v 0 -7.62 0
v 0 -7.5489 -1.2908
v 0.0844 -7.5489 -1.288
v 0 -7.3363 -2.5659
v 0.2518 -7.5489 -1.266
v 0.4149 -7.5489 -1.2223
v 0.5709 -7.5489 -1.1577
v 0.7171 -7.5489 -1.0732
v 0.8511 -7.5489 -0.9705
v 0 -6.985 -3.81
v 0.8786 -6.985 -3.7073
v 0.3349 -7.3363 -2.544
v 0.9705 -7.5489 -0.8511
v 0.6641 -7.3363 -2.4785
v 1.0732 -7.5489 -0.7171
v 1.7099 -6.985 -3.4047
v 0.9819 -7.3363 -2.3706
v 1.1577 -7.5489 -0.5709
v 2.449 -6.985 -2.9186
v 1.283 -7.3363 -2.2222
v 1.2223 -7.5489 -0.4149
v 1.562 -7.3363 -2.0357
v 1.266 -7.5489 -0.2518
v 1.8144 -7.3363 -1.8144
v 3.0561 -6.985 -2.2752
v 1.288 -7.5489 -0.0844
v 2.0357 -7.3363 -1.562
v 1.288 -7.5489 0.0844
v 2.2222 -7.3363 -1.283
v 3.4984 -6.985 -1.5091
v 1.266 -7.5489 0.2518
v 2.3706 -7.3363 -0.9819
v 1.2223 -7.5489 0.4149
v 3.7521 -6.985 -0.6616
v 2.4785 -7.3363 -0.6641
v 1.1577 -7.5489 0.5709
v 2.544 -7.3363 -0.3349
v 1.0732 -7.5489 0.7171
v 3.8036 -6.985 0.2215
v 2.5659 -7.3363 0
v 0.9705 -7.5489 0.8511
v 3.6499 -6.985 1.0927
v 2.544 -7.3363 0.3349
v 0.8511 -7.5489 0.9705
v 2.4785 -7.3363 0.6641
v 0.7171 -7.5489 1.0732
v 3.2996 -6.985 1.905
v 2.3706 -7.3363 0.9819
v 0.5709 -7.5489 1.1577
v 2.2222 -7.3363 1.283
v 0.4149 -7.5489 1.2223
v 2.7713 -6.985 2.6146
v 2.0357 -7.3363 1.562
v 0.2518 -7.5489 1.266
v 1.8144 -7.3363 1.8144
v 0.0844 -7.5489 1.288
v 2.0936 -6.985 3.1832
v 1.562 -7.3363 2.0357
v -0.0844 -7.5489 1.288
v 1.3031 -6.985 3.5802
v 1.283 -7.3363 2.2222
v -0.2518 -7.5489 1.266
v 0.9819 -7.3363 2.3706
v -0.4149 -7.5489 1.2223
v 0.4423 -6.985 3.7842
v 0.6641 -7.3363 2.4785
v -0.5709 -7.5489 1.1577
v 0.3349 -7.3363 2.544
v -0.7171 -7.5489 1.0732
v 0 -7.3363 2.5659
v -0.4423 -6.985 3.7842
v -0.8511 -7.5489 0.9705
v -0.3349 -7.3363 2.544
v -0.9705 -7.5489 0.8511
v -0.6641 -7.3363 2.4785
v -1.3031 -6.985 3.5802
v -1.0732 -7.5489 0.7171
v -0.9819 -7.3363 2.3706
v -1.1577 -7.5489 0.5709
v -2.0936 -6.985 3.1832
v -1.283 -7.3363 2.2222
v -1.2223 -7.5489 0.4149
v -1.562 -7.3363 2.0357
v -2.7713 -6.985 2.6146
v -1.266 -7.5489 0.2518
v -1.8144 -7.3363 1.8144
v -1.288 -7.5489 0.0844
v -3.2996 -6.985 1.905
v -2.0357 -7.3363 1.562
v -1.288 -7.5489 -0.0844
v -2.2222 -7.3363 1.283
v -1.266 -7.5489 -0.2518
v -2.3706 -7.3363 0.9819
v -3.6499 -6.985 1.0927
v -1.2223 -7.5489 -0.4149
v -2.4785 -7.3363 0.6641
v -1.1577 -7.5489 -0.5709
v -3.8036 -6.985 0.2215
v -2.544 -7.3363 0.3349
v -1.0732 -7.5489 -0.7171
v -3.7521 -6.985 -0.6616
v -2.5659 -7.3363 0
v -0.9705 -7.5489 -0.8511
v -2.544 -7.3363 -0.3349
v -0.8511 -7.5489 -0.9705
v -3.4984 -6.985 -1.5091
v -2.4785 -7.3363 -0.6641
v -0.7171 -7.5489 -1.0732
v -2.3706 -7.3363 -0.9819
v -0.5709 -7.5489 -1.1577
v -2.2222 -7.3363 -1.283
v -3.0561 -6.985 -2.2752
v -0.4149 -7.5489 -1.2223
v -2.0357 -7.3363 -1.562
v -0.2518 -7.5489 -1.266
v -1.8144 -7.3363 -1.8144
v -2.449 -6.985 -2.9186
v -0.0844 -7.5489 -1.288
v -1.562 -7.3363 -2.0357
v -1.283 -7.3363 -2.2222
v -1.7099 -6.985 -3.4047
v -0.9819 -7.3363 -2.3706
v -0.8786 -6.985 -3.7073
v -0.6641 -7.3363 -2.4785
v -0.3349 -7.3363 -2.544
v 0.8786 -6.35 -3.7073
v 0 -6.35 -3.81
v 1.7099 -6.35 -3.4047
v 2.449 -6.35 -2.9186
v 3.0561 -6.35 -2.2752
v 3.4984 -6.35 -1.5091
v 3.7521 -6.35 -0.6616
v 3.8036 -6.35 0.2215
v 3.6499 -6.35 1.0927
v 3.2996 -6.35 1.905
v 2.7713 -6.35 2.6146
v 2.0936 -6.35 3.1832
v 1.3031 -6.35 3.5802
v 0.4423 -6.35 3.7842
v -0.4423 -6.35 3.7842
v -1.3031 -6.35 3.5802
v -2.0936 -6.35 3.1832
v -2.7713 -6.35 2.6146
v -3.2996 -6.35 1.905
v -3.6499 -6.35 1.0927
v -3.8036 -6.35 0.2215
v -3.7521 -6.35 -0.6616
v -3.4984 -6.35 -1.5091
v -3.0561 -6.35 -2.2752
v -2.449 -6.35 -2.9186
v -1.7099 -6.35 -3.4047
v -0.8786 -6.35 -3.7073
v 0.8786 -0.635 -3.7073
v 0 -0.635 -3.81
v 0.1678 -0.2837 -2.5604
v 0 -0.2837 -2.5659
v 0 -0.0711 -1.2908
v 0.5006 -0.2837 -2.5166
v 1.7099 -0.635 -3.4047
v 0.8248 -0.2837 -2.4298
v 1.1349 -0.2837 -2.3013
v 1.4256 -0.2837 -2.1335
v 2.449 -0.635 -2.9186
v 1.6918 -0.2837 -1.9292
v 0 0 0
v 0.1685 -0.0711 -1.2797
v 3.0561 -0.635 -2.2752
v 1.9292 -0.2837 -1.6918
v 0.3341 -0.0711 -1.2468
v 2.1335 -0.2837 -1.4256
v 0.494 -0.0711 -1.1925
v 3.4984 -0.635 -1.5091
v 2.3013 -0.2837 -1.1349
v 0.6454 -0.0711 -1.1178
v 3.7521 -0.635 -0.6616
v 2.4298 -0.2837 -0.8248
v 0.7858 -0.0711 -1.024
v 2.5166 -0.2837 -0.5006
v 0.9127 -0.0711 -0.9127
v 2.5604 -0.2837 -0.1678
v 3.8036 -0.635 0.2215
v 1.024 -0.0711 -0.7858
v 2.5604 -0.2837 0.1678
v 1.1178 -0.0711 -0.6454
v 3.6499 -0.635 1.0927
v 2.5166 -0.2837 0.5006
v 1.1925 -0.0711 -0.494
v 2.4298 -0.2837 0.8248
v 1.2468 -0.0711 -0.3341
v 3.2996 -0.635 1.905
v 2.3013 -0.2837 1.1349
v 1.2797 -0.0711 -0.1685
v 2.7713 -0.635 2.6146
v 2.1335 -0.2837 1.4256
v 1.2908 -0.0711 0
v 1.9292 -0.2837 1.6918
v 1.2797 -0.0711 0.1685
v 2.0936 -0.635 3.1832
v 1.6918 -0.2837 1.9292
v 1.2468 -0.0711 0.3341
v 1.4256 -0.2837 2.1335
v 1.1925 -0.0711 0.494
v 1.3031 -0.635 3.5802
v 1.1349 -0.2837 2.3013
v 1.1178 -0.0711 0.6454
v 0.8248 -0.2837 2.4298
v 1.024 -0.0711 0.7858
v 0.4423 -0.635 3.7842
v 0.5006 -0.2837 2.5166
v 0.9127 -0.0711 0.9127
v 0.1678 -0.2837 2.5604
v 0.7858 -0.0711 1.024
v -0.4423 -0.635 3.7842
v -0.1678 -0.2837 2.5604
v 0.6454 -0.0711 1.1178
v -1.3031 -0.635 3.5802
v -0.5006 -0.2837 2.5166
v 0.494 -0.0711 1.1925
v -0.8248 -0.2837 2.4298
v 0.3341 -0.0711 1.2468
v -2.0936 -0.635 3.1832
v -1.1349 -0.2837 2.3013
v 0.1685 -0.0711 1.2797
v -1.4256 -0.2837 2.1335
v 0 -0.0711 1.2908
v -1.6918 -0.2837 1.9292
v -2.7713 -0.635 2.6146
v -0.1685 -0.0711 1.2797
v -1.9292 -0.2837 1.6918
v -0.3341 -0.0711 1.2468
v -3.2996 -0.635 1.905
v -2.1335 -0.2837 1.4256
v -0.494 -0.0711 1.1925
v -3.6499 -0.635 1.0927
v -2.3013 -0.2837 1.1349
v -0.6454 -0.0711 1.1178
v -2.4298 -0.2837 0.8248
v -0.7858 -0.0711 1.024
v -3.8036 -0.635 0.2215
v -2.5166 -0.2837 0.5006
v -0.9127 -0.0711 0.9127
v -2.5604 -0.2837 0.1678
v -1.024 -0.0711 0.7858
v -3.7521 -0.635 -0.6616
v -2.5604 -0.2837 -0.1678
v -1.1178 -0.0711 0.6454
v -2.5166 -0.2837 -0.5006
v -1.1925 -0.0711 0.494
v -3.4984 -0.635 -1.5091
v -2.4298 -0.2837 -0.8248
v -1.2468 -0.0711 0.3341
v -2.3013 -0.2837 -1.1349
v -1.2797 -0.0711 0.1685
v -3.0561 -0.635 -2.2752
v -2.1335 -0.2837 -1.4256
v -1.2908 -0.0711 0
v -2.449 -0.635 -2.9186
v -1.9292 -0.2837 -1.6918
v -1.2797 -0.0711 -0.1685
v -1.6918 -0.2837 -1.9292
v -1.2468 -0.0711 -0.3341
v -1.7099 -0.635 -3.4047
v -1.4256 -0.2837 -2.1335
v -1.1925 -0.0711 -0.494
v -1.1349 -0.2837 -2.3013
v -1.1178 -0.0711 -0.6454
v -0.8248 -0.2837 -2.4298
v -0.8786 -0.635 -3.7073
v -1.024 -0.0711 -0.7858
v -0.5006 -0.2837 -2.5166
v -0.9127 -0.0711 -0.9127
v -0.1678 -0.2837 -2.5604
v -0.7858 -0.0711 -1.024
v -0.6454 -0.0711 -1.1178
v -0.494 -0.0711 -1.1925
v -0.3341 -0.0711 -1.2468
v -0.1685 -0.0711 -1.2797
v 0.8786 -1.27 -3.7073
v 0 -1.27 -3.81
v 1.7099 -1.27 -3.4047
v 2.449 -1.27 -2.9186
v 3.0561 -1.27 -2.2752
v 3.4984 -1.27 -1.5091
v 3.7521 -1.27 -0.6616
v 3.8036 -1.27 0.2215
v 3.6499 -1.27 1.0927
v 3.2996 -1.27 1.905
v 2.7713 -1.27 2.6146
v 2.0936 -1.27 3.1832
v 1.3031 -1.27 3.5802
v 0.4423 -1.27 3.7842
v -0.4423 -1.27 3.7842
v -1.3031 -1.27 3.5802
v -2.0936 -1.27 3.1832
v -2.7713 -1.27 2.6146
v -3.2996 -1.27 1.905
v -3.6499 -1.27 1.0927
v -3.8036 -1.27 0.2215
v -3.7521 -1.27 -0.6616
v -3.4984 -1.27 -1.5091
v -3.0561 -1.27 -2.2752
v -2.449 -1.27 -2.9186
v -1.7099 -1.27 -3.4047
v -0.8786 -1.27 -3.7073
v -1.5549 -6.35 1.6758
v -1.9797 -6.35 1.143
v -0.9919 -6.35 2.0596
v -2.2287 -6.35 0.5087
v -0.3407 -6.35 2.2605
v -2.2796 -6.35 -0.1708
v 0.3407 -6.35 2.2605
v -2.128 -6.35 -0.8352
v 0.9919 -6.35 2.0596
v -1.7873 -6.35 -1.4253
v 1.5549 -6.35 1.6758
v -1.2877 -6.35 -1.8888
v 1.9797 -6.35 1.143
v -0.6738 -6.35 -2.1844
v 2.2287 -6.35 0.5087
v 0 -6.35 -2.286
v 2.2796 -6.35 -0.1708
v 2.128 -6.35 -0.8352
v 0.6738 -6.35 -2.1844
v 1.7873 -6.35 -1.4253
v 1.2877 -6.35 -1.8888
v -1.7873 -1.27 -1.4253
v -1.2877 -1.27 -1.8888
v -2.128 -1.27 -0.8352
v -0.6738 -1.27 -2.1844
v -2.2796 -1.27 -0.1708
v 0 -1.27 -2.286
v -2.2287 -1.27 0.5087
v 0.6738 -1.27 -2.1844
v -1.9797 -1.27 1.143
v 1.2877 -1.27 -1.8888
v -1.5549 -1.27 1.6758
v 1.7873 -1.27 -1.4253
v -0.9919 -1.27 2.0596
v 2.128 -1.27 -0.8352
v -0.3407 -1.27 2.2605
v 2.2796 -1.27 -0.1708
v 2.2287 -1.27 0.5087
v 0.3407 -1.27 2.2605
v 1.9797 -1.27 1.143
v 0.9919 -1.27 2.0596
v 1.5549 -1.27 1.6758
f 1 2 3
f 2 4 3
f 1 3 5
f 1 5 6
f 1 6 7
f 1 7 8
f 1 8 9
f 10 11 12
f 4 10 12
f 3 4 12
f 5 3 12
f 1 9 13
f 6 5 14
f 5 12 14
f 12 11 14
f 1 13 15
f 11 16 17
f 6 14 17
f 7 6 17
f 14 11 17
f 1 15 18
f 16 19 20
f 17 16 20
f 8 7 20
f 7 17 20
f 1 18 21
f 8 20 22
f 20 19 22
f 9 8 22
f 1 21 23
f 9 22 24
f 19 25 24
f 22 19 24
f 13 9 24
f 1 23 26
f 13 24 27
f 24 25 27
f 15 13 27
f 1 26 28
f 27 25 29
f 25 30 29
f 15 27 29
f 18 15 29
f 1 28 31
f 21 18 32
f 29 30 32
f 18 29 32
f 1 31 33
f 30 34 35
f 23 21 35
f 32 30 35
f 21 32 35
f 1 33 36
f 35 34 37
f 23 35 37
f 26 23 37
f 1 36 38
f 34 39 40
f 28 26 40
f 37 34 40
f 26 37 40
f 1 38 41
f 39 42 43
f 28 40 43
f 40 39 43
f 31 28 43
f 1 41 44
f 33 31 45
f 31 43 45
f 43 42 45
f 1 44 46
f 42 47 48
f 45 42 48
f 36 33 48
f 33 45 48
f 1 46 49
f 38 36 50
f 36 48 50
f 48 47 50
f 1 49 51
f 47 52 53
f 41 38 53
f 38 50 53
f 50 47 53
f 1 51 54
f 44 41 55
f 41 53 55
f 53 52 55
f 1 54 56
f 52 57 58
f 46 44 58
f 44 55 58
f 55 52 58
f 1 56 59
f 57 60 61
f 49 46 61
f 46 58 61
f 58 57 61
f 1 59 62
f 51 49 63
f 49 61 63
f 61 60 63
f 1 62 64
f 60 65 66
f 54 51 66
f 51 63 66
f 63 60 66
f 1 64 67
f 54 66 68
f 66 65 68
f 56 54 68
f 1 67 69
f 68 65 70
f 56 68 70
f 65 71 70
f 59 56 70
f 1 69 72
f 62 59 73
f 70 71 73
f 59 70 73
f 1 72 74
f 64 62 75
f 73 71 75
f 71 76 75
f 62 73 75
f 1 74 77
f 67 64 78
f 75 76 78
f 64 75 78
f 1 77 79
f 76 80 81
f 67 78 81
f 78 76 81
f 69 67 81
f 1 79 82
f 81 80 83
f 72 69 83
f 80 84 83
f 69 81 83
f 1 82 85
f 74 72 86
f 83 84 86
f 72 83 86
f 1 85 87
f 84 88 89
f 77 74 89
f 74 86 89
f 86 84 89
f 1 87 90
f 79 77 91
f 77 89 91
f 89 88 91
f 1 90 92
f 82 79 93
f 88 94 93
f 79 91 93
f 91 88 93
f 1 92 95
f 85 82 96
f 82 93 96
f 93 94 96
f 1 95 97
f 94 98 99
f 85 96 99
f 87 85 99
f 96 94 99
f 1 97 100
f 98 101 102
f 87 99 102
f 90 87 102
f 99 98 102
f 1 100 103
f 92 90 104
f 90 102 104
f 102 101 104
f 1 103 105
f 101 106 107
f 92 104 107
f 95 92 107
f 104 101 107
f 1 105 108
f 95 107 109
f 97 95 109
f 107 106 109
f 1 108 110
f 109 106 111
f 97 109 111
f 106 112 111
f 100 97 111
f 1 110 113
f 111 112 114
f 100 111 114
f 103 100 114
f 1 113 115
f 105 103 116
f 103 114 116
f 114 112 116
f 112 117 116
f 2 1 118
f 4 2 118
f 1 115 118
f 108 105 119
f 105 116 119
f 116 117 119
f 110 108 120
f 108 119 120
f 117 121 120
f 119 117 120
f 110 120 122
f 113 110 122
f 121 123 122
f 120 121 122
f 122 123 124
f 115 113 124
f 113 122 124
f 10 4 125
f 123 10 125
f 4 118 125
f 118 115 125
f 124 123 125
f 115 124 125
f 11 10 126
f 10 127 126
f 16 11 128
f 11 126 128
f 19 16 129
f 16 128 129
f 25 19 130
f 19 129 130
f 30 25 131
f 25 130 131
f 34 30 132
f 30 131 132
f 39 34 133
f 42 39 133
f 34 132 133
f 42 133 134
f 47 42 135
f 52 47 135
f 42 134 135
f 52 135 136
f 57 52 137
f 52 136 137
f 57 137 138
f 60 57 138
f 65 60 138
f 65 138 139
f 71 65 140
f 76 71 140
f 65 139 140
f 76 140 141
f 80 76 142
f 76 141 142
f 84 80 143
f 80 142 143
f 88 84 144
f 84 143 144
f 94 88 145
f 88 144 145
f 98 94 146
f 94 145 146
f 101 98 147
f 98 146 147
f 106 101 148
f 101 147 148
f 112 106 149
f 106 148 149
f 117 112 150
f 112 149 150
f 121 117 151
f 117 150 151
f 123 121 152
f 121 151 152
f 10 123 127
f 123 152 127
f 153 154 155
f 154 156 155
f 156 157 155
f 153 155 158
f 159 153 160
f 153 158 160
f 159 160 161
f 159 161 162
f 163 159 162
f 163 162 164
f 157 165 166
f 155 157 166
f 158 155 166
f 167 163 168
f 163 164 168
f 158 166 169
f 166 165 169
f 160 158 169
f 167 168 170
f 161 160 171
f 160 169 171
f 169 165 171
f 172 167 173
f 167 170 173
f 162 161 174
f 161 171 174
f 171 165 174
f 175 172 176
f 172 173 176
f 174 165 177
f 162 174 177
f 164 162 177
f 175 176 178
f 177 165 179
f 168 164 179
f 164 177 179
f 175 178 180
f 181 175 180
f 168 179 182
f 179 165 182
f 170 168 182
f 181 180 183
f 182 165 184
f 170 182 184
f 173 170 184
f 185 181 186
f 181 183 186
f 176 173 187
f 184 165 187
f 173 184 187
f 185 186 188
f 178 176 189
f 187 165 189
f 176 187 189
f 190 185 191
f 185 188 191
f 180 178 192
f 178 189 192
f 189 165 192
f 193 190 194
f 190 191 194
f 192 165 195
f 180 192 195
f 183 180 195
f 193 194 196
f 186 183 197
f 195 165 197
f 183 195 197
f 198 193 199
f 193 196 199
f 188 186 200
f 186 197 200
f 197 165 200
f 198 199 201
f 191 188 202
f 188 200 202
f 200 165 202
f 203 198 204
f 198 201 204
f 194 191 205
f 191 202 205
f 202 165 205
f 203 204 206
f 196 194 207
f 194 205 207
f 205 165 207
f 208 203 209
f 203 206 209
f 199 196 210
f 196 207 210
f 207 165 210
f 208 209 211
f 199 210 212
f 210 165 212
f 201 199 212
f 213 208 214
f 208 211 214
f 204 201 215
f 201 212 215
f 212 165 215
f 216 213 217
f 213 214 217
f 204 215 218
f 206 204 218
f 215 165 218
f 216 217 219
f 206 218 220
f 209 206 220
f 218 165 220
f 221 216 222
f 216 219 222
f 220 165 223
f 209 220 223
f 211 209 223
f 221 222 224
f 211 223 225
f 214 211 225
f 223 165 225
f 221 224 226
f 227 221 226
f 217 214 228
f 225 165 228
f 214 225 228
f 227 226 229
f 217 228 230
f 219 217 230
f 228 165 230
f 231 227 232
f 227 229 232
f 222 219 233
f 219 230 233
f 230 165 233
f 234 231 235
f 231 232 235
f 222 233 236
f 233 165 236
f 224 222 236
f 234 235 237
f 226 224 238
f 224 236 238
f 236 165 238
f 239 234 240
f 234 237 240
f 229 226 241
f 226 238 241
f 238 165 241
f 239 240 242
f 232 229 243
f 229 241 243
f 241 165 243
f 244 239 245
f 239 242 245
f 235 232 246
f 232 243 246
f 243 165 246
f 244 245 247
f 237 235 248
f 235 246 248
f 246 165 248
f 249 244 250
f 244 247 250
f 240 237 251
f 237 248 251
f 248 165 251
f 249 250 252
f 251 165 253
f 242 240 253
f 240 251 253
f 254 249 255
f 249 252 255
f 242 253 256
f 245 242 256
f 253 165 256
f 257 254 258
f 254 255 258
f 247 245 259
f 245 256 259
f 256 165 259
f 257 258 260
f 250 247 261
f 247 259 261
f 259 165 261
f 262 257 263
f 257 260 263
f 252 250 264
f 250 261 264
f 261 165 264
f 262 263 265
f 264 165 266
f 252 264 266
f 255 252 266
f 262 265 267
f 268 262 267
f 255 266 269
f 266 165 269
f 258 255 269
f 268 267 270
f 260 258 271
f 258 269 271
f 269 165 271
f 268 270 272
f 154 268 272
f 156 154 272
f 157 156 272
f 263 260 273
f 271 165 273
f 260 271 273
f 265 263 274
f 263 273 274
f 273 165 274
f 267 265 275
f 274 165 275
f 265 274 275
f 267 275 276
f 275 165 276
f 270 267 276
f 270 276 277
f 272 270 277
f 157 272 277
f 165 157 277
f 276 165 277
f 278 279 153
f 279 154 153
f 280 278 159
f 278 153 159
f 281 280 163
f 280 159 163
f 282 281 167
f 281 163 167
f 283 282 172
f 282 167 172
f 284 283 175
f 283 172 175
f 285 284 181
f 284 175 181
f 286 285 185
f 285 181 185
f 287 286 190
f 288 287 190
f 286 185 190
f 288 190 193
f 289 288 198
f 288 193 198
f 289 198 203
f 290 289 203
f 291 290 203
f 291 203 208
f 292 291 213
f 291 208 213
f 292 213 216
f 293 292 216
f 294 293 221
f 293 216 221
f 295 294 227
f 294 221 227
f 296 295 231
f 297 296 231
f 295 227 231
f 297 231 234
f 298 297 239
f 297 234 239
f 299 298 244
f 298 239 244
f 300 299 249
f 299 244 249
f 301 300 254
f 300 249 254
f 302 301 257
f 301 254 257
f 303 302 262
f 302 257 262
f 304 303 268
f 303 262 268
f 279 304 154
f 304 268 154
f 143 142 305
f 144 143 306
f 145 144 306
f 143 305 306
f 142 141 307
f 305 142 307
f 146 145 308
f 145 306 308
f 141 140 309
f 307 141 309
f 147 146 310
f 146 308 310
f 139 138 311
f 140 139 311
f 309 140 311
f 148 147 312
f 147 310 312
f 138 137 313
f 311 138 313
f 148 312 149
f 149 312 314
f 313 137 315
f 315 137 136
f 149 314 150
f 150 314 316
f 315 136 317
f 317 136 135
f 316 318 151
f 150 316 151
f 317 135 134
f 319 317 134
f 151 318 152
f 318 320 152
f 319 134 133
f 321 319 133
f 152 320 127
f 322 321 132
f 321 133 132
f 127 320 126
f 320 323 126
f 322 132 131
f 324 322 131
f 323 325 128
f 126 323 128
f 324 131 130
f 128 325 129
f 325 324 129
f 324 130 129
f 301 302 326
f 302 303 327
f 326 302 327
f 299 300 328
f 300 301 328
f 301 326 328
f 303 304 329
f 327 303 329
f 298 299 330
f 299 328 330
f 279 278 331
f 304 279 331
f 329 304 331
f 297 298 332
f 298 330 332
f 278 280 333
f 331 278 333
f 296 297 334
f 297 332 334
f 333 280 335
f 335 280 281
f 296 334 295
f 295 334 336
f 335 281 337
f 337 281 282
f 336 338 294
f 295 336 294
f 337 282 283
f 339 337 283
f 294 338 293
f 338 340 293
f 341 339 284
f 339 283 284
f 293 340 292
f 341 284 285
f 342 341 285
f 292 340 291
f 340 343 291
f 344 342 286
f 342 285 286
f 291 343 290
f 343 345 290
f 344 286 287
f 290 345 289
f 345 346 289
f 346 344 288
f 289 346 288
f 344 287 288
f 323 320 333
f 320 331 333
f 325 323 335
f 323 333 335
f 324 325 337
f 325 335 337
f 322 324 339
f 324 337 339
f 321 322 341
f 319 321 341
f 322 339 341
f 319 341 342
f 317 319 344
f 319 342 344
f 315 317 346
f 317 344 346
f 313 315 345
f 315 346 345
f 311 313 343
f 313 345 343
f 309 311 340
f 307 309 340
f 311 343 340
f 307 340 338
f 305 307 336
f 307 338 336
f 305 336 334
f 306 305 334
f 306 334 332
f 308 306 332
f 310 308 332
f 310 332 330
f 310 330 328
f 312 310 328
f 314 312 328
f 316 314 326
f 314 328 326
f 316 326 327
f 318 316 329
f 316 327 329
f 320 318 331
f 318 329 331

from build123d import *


with BuildPart() as part:
    # Sketch1 → Revolve1 (revolve)
    with BuildSketch(Plane(origin=(0, 0, 0), x_dir=(0, 0, -1), z_dir=(1, 0, 0))):
        with BuildLine():
            Line((0, 0), (0, -7.62))
            ThreePointArc((0, -7.62), (1.931277103, -7.46016262), (3.81, -6.985))
            Line((3.81, -6.985), (3.81, -6.35))
            Line((3.81, -6.35), (2.286, -6.35))
            Line((2.286, -6.35), (2.286, -1.27))
            Line((2.286, -1.27), (3.81, -1.27))
            Line((3.81, -1.27), (3.81, -0.635))
            ThreePointArc((3.81, -0.635), (1.931277103, -0.15983738), (0, 0))
        make_face()
    revolve(axis=Axis((0, 0, 0), (0, -1, 0)))


solid = part.part
